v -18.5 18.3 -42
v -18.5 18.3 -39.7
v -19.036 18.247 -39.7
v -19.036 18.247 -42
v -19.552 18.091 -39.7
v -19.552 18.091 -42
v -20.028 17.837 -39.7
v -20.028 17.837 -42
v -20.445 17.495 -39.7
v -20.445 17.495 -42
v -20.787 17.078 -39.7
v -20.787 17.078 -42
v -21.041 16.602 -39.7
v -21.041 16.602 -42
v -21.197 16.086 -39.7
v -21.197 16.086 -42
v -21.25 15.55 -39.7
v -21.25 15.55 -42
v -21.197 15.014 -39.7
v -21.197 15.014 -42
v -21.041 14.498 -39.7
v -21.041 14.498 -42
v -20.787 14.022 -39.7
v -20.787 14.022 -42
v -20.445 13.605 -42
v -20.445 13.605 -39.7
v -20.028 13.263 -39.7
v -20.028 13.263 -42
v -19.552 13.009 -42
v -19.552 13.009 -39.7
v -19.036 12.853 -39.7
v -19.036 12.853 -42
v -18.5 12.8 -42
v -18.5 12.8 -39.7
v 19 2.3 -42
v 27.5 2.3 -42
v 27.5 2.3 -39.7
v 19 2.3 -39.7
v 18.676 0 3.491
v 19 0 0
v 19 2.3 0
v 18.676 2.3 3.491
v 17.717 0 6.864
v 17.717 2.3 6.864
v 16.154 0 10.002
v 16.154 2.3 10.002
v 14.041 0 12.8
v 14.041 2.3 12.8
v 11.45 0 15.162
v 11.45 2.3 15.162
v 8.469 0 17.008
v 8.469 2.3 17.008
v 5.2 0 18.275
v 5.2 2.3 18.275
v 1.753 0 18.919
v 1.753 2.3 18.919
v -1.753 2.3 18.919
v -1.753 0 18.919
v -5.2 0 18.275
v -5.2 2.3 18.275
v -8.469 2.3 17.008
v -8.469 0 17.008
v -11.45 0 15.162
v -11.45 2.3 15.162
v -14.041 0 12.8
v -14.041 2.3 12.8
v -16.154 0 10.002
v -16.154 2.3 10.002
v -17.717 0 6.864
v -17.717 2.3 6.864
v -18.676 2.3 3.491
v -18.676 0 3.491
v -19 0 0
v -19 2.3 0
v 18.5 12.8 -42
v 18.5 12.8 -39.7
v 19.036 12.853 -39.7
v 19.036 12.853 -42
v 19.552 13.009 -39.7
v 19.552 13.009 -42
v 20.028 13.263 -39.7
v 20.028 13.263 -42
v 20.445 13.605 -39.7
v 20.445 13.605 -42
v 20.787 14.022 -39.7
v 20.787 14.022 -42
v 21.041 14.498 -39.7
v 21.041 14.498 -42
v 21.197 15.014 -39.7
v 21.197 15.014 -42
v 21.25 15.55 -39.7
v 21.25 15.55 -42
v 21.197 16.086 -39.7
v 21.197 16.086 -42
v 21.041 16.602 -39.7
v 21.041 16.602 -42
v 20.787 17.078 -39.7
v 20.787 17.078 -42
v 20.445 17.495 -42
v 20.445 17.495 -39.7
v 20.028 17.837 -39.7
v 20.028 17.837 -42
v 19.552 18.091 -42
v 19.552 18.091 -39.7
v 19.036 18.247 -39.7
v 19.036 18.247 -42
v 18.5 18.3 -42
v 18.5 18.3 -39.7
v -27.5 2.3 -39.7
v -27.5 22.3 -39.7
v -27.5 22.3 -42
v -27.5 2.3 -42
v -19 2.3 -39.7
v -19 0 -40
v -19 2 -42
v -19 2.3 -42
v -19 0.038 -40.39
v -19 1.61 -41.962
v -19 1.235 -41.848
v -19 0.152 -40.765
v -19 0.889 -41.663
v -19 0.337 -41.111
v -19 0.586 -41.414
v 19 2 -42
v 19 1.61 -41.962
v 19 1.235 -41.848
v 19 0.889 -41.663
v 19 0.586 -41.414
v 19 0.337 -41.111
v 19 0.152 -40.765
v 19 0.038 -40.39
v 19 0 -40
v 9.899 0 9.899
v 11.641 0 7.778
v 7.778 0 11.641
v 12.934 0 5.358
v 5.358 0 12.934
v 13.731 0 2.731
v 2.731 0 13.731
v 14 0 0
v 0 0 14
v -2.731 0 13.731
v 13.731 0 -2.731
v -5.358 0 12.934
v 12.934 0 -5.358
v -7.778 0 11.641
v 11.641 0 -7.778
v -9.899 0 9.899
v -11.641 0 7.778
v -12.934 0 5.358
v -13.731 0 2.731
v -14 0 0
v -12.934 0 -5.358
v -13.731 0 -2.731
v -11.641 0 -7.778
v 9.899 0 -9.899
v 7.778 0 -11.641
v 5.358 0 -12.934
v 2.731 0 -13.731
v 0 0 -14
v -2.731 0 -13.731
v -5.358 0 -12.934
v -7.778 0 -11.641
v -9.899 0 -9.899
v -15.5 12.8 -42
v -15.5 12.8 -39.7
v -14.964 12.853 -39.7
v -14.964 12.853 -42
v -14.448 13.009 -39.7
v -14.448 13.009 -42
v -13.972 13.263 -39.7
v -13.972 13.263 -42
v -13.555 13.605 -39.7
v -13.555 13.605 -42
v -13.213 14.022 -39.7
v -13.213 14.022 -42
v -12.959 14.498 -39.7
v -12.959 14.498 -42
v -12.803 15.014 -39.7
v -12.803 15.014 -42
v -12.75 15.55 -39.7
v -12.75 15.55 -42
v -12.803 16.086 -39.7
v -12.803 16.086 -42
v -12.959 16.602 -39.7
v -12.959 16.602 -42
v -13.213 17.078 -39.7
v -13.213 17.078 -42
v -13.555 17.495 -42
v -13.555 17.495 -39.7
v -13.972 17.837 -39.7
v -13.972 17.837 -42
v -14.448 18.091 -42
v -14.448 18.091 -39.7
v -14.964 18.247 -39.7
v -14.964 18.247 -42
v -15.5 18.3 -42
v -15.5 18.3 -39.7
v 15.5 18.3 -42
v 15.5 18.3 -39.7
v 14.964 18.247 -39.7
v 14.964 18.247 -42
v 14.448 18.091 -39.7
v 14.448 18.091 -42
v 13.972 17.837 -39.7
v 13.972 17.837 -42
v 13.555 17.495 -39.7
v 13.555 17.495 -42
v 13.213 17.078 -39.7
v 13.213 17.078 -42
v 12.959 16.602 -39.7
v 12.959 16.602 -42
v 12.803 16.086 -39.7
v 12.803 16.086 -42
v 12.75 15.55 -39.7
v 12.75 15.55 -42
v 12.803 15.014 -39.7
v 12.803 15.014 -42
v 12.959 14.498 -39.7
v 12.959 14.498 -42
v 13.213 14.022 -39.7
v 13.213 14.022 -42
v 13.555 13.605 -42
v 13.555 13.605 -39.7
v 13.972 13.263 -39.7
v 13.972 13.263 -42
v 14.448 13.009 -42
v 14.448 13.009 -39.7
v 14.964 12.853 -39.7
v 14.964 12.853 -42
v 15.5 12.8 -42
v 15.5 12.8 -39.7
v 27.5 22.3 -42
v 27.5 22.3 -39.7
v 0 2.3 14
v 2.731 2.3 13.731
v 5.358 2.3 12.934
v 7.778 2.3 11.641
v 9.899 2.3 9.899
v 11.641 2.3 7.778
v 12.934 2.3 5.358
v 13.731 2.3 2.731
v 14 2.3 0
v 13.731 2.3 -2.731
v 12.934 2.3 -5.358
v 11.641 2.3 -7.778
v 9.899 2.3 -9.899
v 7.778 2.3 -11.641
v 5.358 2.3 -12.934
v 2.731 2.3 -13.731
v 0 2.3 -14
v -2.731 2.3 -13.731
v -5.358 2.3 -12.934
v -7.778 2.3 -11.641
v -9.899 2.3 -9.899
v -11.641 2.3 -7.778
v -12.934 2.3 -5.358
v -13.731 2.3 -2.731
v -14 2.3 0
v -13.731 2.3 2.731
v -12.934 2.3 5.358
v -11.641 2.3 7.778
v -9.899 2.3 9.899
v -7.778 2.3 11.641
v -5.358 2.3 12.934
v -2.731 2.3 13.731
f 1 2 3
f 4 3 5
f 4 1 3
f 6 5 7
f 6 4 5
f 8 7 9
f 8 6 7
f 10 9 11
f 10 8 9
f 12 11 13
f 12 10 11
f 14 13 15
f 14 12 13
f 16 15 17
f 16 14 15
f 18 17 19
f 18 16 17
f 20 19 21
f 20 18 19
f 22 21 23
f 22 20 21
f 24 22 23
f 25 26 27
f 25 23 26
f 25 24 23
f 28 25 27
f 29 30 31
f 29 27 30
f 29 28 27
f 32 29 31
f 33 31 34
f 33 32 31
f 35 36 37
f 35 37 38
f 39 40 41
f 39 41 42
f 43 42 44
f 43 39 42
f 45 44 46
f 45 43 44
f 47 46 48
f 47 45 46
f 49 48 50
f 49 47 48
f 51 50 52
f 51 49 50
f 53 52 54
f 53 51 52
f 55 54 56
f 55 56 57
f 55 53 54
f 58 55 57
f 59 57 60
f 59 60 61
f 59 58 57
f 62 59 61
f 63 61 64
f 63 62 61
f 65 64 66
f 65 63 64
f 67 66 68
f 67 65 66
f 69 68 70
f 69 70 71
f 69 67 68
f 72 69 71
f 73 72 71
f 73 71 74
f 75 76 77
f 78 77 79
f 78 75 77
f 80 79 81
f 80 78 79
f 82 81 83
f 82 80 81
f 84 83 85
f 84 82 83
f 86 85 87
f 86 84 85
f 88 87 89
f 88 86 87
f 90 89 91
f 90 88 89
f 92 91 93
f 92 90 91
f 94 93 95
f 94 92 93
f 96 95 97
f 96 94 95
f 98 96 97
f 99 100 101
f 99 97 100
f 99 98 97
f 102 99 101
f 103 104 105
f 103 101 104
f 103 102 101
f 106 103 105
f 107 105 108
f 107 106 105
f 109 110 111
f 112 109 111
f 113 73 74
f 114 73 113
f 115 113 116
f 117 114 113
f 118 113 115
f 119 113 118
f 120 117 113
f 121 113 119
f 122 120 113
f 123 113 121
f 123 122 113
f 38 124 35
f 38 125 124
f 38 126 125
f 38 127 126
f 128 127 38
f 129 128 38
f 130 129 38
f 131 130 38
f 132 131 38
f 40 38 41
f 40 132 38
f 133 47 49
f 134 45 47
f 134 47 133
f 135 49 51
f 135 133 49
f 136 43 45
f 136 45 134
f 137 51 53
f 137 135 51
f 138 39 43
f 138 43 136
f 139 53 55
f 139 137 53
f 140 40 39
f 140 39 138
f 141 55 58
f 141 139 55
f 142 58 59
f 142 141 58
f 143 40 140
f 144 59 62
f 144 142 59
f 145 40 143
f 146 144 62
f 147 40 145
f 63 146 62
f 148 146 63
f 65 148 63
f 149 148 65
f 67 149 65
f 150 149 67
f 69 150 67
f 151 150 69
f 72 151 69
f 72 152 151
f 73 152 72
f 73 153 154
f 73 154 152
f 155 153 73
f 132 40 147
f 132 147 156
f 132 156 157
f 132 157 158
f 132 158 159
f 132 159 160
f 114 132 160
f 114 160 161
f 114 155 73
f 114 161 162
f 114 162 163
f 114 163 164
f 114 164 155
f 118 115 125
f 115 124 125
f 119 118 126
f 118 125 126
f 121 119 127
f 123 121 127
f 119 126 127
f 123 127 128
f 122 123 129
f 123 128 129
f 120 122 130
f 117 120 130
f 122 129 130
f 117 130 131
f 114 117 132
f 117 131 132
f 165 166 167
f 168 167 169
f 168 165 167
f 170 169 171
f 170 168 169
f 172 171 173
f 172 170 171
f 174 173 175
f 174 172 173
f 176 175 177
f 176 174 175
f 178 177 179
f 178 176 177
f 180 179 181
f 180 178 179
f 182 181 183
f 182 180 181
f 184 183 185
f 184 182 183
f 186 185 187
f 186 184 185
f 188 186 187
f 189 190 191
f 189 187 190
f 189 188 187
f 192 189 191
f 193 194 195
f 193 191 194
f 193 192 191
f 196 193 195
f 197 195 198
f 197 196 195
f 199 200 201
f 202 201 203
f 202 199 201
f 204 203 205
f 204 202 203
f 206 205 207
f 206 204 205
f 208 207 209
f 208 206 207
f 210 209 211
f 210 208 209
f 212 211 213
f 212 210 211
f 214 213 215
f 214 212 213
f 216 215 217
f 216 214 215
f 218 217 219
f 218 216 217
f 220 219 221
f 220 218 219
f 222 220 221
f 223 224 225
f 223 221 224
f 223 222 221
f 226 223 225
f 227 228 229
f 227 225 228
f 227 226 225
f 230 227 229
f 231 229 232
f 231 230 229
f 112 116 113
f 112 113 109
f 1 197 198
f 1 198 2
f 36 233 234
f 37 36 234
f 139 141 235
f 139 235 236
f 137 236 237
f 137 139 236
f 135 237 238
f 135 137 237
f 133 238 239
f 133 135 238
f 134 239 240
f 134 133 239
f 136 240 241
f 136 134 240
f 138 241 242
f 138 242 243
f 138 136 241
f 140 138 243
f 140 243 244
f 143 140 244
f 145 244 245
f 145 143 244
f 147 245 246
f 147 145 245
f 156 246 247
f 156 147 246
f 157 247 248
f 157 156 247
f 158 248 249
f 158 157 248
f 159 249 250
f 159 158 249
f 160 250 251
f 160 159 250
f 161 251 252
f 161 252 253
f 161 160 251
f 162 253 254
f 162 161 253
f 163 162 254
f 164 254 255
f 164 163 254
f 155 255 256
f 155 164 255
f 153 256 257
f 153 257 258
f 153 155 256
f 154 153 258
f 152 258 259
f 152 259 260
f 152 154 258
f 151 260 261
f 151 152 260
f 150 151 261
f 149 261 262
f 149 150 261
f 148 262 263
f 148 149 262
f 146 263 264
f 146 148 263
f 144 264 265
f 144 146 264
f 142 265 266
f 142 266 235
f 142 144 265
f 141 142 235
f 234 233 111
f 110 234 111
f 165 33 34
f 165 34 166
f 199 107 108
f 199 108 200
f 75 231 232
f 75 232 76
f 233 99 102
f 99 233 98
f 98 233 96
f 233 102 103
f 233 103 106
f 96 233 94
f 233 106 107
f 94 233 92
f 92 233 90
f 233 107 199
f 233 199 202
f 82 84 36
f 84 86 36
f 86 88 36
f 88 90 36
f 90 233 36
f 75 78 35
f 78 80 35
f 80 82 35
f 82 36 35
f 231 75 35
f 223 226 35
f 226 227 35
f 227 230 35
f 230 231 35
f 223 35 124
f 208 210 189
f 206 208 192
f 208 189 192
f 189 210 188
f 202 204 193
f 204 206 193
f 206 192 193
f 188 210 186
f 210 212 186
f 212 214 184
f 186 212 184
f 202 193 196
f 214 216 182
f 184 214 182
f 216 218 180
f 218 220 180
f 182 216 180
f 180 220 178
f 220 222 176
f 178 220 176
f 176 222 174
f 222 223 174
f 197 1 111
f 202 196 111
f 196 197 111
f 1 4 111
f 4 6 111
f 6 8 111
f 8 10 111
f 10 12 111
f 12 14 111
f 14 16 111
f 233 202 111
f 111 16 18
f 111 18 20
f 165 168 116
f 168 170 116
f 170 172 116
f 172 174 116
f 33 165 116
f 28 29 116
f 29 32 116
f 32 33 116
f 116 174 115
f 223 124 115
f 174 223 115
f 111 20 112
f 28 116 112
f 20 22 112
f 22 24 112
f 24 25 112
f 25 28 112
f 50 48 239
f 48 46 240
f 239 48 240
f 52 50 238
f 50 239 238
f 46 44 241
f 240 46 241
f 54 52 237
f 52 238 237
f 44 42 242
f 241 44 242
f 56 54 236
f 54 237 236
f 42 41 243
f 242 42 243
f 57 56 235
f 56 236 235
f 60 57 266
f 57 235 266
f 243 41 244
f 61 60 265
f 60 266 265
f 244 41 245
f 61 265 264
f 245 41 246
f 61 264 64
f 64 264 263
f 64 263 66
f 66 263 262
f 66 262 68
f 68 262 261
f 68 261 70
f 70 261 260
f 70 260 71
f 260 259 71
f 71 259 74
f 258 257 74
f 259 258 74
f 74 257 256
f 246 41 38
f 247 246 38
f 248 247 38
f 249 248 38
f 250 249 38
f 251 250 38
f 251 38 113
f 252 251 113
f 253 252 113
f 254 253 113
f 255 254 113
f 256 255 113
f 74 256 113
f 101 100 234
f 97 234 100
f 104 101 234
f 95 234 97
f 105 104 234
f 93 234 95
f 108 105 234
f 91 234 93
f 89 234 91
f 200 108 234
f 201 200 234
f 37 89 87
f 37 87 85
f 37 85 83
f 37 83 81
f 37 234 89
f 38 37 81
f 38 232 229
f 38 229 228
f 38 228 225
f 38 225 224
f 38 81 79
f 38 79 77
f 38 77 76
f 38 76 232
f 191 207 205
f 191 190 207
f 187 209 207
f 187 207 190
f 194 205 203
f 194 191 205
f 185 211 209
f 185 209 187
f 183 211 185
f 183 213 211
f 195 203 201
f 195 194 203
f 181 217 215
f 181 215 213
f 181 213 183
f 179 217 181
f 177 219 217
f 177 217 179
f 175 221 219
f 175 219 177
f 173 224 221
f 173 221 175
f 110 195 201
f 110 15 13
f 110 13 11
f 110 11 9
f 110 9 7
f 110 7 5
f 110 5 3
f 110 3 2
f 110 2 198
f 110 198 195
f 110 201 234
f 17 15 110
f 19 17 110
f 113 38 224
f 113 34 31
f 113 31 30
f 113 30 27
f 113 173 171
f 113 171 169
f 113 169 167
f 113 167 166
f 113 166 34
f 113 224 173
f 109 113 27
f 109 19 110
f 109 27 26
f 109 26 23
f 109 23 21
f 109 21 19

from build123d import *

# Parameters (mm, degrees)
SKETCH_1_R          = 14
EXTRUDE_1_DEPTH     = 2.3
EXTRUDE_2_DEPTH     = 20
FILLET_1_R          = 2
CUT_EXTRUDE_3_DEPTH = 71.530418969


with BuildPart() as part:
    # 草图1 → 拉伸1 (new body)
    with BuildSketch(Plane(origin=(0, 0, 0), x_dir=(1, 0, 0), z_dir=(0, 1, 0))):
        with BuildLine():
            Line((-19, 0), (-19, 42))
            Line((-19, 42), (19, 42))
            Line((19, 42), (19, 0))
            ThreePointArc((19, 0), (0, -19), (-19, 0))
        make_face()
        with Locations(Location((0, 0, 0), (0, 0, 270))):
            Circle(SKETCH_1_R, mode=Mode.SUBTRACT)
    extrude(amount=EXTRUDE_1_DEPTH)

    # 草图2 → 拉伸2 (add)
    with BuildSketch(Plane(origin=(0, 2.3, 0), x_dir=(1, 0, 0), z_dir=(0, 1, 0))):
        Polygon((0, 42), (27.5, 42), (27.5, 39.7), (-27.5, 39.7), (-27.5, 42), align=None)
    extrude(amount=EXTRUDE_2_DEPTH)

    # 圆角1
    fillet_1_edges = [part.edges().sort_by_distance(p)[0] for p in [
        (0, 0, -42),
    ]]
    fillet(fillet_1_edges, radius=FILLET_1_R)

    # 草图3 → 拉伸3 (cut, through all)
    with BuildSketch(Plane(origin=(0, 0, -42), x_dir=(-1, 0, 0), z_dir=(0, 0, -1))):
        with BuildLine():
            Line((-18.5, 18.3), (-15.5, 18.3))
            ThreePointArc((-15.5, 18.3), (-12.75, 15.55), (-15.5, 12.8))
            Line((-15.5, 12.8), (-18.5, 12.8))
            ThreePointArc((-18.5, 12.8), (-21.25, 15.55), (-18.5, 18.3))
        make_face()
        with BuildLine():
            Line((15.5, 18.3), (18.5, 18.3))
            ThreePointArc((18.5, 18.3), (21.25, 15.55), (18.5, 12.8))
            Line((18.5, 12.8), (15.5, 12.8))
            ThreePointArc((15.5, 12.8), (12.75, 15.55), (15.5, 18.3))
        make_face()
    extrude(amount=-CUT_EXTRUDE_3_DEPTH, mode=Mode.SUBTRACT)


solid = part.part
